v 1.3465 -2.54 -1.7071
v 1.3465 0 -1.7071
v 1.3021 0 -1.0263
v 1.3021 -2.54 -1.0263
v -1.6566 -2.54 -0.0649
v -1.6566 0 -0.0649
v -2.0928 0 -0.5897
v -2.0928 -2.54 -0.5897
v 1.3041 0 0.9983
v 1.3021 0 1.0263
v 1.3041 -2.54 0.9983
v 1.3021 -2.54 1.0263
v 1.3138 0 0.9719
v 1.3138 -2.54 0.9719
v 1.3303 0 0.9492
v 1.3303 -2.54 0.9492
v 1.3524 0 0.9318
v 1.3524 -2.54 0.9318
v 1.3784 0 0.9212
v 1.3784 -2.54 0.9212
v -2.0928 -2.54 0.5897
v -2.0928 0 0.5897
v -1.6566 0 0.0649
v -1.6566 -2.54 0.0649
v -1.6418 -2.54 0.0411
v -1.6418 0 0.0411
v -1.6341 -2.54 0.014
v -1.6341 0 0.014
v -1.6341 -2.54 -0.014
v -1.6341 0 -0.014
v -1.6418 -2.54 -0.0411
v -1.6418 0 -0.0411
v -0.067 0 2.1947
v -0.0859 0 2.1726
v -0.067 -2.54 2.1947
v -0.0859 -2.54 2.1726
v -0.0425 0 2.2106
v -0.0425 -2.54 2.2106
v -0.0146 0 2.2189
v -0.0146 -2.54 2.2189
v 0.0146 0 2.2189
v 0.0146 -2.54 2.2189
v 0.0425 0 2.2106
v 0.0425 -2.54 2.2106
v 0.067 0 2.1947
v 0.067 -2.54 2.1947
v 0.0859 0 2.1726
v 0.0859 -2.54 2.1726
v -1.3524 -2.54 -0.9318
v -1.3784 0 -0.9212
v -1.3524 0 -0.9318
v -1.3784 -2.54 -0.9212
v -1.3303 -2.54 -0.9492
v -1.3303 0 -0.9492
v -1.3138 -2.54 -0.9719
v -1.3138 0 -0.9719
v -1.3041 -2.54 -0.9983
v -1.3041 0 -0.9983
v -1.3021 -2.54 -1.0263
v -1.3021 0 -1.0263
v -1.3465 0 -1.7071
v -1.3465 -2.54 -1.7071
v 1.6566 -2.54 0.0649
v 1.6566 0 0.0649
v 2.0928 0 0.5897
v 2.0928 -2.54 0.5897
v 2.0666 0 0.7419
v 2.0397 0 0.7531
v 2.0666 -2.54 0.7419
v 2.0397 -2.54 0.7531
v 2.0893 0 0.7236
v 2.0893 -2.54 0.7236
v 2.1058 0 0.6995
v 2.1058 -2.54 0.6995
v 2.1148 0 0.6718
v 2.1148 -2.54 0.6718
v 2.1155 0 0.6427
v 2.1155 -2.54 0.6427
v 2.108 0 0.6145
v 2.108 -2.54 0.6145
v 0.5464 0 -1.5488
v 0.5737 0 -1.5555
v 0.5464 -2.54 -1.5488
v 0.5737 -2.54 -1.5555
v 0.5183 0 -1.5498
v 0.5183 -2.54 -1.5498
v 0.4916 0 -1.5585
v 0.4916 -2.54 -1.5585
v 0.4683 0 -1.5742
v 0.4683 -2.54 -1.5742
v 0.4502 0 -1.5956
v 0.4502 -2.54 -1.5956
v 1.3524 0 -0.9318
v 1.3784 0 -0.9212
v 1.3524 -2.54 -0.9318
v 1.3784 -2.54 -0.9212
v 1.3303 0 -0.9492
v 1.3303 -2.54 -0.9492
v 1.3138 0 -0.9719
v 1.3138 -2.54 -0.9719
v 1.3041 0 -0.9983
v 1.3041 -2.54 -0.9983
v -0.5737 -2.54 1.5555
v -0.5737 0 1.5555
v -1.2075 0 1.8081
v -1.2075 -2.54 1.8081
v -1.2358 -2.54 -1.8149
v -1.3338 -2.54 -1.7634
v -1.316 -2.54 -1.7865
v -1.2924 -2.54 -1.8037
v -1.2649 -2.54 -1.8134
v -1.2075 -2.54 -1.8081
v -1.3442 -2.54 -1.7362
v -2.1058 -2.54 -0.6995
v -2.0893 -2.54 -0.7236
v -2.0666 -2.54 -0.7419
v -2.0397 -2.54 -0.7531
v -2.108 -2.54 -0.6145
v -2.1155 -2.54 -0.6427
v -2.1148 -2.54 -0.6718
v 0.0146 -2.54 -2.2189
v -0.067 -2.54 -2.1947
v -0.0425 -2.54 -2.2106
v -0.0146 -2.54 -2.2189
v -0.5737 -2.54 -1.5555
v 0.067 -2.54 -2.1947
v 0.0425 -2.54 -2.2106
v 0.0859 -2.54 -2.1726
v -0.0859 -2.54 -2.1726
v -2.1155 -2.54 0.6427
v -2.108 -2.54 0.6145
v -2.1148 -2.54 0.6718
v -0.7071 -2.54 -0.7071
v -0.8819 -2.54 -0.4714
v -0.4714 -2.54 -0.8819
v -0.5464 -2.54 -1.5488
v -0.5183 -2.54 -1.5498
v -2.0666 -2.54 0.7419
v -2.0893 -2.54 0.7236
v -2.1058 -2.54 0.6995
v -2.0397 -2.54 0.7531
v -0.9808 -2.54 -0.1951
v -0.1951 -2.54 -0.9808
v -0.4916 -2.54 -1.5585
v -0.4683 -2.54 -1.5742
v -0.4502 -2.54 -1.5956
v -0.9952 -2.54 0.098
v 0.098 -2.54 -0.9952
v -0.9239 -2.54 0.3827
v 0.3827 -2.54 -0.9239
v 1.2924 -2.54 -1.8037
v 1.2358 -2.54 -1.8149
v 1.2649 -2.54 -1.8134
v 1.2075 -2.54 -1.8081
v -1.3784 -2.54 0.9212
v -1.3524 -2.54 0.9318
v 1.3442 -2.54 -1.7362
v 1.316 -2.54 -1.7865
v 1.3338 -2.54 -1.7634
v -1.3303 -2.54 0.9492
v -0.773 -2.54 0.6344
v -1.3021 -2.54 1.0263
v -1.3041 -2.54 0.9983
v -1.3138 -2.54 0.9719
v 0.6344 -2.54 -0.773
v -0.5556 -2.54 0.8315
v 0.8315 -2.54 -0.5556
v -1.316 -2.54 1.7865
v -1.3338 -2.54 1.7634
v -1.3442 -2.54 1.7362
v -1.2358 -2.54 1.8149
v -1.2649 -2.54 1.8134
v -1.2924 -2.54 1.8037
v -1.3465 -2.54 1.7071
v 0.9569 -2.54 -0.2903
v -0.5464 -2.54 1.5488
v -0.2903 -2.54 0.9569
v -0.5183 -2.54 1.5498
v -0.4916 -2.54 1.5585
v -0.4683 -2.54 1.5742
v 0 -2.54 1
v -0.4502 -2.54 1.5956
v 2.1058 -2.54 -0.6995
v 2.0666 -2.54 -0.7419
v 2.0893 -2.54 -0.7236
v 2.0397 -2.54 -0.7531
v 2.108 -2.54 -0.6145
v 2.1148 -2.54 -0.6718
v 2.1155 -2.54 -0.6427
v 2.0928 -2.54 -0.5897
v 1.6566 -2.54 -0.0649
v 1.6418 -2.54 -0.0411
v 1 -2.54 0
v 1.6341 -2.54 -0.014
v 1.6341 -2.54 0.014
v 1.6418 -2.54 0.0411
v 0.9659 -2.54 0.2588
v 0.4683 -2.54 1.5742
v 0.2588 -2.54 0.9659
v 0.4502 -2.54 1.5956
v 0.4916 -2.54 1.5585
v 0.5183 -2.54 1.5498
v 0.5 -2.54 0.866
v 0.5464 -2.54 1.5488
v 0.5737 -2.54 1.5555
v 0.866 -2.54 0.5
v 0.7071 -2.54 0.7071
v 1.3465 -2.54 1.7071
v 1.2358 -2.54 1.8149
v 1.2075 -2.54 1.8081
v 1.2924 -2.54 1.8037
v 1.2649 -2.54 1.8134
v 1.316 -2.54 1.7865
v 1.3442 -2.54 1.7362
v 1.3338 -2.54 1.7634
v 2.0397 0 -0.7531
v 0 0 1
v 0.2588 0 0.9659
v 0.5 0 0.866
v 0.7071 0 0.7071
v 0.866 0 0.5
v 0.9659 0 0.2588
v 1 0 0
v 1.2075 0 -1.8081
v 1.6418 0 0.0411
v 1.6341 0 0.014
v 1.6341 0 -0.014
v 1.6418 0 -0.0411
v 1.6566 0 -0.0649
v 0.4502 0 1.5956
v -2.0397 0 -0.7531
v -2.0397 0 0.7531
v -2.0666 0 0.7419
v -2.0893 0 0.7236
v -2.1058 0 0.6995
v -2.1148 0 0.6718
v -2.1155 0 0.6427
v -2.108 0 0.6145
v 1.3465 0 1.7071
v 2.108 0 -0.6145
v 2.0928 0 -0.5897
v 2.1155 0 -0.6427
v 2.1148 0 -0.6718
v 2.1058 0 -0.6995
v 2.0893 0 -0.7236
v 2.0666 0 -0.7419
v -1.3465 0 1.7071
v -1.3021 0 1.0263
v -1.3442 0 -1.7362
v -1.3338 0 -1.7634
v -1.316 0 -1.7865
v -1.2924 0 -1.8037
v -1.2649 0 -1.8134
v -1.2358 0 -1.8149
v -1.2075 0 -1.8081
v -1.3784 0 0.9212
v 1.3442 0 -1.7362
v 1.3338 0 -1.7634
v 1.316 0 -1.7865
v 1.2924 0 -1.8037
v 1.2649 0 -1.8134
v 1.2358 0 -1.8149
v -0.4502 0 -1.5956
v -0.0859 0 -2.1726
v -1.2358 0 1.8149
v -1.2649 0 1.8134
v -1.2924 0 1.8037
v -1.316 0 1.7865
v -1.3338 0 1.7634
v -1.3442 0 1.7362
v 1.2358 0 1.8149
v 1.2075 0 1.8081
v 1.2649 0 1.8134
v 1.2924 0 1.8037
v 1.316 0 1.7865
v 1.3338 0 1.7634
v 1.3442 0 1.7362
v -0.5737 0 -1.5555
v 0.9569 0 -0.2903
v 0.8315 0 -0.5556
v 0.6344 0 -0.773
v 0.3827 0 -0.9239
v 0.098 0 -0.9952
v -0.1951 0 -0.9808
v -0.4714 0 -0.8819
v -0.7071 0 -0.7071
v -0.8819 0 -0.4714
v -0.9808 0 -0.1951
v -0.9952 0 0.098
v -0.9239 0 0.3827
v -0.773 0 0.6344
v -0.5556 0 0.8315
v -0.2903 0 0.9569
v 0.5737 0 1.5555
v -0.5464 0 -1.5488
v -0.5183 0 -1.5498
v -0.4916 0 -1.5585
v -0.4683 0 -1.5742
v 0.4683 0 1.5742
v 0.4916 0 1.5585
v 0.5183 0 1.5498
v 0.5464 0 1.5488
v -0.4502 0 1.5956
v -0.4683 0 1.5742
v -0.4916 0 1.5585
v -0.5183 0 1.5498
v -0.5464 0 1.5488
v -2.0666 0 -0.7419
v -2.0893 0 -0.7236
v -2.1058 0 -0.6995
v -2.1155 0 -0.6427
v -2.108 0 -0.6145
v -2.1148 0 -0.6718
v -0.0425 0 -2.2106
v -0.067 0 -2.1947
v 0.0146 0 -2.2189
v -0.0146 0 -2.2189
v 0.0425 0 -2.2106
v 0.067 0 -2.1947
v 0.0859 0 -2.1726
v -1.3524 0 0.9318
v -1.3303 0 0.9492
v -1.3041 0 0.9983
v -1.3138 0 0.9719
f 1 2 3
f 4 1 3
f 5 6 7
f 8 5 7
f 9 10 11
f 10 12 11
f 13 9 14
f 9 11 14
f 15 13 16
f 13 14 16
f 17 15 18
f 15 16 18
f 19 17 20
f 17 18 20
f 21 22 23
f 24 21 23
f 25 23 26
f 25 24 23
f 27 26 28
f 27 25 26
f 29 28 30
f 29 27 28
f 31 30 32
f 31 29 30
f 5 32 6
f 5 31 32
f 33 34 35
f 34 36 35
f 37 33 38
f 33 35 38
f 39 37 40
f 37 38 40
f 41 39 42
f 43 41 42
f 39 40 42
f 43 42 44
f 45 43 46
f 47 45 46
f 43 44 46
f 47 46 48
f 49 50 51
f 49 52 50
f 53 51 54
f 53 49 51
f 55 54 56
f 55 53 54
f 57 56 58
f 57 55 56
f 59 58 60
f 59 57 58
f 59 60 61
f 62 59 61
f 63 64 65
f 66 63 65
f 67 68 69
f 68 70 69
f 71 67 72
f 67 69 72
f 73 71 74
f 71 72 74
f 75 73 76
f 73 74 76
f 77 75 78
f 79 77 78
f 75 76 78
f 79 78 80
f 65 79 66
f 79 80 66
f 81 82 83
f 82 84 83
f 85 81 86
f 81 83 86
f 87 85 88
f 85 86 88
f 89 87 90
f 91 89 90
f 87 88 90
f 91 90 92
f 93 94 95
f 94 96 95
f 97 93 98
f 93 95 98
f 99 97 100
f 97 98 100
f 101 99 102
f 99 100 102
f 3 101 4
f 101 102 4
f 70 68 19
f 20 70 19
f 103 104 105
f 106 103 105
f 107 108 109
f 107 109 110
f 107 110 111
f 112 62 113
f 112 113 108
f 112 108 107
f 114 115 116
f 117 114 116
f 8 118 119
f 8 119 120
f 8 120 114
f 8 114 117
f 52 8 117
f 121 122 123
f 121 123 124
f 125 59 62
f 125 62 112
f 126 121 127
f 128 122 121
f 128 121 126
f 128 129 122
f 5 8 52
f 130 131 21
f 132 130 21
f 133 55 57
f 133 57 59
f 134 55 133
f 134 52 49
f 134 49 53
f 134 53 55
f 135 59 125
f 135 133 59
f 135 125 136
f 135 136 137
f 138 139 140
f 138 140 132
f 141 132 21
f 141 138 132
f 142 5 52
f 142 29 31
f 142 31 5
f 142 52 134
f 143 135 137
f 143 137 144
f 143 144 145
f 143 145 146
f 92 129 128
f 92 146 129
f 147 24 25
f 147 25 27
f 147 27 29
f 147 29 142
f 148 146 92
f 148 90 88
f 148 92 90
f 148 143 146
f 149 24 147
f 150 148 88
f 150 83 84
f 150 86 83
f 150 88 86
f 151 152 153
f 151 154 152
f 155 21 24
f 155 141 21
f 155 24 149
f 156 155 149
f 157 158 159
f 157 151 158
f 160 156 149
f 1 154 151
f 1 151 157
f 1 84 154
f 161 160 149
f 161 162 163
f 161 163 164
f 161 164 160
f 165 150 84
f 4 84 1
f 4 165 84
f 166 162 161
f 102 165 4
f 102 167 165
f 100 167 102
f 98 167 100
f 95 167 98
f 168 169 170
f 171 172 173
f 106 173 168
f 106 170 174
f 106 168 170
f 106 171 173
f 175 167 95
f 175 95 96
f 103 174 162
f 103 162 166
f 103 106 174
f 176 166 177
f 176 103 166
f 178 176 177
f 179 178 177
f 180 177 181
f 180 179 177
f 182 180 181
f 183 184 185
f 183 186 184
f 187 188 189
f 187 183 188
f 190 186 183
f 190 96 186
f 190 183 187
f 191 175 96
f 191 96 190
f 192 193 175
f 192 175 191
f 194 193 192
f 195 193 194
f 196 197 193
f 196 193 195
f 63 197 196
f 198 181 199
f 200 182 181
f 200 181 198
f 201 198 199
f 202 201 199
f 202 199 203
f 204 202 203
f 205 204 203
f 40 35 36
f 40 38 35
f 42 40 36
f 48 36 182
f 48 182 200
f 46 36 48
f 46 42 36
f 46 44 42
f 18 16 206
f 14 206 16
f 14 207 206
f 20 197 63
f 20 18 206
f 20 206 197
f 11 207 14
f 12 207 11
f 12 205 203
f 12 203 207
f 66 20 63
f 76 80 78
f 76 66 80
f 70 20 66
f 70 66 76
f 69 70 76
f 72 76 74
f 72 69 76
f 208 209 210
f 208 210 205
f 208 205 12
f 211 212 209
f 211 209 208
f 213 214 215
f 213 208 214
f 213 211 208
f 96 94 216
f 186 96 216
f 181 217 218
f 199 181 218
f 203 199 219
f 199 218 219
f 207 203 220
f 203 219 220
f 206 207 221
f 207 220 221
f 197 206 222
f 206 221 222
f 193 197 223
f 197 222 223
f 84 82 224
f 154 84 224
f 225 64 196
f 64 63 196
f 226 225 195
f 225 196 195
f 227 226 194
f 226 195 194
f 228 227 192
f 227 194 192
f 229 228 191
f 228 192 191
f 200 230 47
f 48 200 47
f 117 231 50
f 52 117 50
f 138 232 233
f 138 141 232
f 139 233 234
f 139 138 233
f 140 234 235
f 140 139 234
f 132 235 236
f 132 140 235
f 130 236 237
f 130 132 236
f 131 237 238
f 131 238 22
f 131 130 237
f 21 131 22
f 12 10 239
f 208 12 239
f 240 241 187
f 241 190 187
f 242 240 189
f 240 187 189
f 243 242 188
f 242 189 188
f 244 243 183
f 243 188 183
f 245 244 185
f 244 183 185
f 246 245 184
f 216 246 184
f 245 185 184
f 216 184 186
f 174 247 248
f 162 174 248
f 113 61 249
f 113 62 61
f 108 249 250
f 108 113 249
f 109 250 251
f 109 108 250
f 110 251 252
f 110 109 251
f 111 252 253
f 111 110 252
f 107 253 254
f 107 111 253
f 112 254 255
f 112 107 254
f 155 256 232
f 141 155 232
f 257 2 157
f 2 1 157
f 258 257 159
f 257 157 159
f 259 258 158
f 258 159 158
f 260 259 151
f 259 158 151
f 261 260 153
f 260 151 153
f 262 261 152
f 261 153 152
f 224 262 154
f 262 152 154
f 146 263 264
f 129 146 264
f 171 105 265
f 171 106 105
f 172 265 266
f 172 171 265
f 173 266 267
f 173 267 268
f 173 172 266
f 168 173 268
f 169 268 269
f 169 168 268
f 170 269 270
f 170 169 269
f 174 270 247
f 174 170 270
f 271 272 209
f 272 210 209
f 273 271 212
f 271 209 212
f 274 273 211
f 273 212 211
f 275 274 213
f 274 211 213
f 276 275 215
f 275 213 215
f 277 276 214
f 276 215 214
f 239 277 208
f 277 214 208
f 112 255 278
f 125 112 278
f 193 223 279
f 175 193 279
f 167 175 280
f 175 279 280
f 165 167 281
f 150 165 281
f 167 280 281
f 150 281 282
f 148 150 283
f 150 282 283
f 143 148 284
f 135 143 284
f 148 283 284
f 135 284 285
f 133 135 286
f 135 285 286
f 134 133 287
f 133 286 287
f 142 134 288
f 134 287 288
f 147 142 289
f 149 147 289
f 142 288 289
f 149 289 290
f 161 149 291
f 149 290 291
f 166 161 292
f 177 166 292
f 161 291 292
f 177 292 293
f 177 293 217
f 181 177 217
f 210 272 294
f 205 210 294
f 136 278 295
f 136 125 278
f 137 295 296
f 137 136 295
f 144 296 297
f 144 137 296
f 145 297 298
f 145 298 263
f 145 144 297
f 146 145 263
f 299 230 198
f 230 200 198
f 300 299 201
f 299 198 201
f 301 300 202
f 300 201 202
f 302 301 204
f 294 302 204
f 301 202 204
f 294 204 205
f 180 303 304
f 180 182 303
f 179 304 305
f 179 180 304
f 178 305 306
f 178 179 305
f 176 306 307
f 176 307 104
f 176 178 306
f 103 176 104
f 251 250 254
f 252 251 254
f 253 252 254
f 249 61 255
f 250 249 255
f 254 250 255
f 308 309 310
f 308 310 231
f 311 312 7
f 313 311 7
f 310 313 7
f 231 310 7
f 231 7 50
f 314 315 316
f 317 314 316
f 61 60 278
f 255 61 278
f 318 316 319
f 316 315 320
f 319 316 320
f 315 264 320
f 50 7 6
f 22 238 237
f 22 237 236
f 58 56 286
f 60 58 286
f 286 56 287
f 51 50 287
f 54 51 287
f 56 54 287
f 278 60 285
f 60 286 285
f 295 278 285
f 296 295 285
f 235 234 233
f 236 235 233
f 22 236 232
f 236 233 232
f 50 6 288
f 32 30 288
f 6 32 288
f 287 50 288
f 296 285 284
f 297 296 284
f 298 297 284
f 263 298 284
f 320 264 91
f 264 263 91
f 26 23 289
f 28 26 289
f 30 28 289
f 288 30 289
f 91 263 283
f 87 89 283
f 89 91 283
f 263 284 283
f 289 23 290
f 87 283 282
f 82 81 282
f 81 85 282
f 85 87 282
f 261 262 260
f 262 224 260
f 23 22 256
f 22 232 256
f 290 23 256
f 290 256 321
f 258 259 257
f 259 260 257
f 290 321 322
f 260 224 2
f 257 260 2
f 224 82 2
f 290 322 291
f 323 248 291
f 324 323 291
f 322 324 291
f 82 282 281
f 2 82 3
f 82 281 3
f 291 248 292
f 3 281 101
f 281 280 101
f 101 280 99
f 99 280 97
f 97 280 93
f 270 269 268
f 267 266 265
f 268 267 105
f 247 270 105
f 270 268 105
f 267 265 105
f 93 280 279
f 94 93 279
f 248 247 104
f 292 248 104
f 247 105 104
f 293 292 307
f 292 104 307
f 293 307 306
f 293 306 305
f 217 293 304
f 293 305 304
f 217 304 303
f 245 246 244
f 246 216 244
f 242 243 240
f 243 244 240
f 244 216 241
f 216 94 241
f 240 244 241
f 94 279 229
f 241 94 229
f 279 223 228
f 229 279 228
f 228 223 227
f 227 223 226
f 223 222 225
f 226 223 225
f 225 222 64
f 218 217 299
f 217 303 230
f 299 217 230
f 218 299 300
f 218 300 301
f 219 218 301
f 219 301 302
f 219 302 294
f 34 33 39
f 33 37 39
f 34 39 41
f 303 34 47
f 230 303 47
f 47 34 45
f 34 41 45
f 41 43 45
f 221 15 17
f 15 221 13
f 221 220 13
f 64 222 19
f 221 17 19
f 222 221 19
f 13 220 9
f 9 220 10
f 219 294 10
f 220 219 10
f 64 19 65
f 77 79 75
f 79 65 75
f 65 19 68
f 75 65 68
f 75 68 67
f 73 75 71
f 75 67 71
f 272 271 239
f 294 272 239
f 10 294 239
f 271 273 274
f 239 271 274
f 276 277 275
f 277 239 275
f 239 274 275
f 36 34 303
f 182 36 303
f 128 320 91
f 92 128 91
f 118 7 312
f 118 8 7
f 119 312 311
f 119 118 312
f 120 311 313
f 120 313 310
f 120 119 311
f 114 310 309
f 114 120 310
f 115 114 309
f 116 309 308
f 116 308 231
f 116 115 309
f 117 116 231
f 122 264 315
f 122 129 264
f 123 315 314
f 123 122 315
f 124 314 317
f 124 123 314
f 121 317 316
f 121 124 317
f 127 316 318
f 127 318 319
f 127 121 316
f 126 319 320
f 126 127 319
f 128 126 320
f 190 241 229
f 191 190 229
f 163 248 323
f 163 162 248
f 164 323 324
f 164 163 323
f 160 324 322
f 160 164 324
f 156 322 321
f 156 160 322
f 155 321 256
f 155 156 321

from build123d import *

# Parameters (mm, degrees)
F1_DEPTH = 2.54
F2_R     = 0.1016


# Not quite as in the source:
# - a feature names something its author has since deleted; it is built from what else it names


with BuildPart() as f1:
    # F0 (on Front) → F1 (new body)
    with BuildSketch(Plane.XZ):
        Polygon((0, 2.3086211489), (-0.4952492845, 1.5242205696), (-1.3569734644, 1.867713743), (-1.2965794597, 0.9420201184), (-2.1956291873, 0.7134031686), (-1.6026603504, 0), (-2.1956291873, -0.7134031686), (-1.2965794597, -0.9420201184), (-1.3569734644, -1.867713743), (-0.4952492845, -1.5242205696), (0, -2.3086211489), (0.4952492845, -1.5242205696), (1.3569734644, -1.867713743), (1.2965794597, -0.9420201184), (2.1956291873, -0.7134031686), (1.6026603504, 0), (2.1956291873, 0.7134031686), (1.2965794597, 0.9420201184), (1.3569734644, 1.867713743), (0.4952492845, 1.5242205696), align=None)
        with BuildLine():
            ThreePointArc((0, 1.00000054), (0.707107163, 0.707107163), (1.00000054, 0))
            ThreePointArc((1.00000054, 0), (-0.707107163, -0.707107163), (0, 1.00000054))
        make_face(mode=Mode.SUBTRACT)
    extrude(amount=F1_DEPTH)

    # F2
    f2_edges = [f1.edges().sort_by_distance(p)[0] for p in [
        (0, -1.27, 2.308621),
        (0.495249, -1.27, 1.524221),
        (1.356973, -1.27, 1.867714),
        (1.296579, -1.27, 0.94202),
        (2.195629, -1.27, 0.713403),
        (1.60266, -1.27, 0),
        (2.195629, -1.27, -0.713403),
        (1.296579, -1.27, -0.94202),
        (1.356973, -1.27, -1.867714),
        (0.495249, -1.27, -1.524221),
        (0, -1.27, -2.308621),
        (-1.356973, -1.27, -1.867714),
        (-0.495249, -1.27, -1.524221),
        (-1.296579, -1.27, -0.94202),
        (-2.195629, -1.27, -0.713403),
        (-1.60266, -1.27, 0),
        (-2.195629, -1.27, 0.713403),
        (-1.296579, -1.27, 0.94202),
        (-1.356973, -1.27, 1.867714),
        (-0.495249, -1.27, 1.524221),
    ]]
    fillet(f2_edges, radius=F2_R)


solid = f1.part
